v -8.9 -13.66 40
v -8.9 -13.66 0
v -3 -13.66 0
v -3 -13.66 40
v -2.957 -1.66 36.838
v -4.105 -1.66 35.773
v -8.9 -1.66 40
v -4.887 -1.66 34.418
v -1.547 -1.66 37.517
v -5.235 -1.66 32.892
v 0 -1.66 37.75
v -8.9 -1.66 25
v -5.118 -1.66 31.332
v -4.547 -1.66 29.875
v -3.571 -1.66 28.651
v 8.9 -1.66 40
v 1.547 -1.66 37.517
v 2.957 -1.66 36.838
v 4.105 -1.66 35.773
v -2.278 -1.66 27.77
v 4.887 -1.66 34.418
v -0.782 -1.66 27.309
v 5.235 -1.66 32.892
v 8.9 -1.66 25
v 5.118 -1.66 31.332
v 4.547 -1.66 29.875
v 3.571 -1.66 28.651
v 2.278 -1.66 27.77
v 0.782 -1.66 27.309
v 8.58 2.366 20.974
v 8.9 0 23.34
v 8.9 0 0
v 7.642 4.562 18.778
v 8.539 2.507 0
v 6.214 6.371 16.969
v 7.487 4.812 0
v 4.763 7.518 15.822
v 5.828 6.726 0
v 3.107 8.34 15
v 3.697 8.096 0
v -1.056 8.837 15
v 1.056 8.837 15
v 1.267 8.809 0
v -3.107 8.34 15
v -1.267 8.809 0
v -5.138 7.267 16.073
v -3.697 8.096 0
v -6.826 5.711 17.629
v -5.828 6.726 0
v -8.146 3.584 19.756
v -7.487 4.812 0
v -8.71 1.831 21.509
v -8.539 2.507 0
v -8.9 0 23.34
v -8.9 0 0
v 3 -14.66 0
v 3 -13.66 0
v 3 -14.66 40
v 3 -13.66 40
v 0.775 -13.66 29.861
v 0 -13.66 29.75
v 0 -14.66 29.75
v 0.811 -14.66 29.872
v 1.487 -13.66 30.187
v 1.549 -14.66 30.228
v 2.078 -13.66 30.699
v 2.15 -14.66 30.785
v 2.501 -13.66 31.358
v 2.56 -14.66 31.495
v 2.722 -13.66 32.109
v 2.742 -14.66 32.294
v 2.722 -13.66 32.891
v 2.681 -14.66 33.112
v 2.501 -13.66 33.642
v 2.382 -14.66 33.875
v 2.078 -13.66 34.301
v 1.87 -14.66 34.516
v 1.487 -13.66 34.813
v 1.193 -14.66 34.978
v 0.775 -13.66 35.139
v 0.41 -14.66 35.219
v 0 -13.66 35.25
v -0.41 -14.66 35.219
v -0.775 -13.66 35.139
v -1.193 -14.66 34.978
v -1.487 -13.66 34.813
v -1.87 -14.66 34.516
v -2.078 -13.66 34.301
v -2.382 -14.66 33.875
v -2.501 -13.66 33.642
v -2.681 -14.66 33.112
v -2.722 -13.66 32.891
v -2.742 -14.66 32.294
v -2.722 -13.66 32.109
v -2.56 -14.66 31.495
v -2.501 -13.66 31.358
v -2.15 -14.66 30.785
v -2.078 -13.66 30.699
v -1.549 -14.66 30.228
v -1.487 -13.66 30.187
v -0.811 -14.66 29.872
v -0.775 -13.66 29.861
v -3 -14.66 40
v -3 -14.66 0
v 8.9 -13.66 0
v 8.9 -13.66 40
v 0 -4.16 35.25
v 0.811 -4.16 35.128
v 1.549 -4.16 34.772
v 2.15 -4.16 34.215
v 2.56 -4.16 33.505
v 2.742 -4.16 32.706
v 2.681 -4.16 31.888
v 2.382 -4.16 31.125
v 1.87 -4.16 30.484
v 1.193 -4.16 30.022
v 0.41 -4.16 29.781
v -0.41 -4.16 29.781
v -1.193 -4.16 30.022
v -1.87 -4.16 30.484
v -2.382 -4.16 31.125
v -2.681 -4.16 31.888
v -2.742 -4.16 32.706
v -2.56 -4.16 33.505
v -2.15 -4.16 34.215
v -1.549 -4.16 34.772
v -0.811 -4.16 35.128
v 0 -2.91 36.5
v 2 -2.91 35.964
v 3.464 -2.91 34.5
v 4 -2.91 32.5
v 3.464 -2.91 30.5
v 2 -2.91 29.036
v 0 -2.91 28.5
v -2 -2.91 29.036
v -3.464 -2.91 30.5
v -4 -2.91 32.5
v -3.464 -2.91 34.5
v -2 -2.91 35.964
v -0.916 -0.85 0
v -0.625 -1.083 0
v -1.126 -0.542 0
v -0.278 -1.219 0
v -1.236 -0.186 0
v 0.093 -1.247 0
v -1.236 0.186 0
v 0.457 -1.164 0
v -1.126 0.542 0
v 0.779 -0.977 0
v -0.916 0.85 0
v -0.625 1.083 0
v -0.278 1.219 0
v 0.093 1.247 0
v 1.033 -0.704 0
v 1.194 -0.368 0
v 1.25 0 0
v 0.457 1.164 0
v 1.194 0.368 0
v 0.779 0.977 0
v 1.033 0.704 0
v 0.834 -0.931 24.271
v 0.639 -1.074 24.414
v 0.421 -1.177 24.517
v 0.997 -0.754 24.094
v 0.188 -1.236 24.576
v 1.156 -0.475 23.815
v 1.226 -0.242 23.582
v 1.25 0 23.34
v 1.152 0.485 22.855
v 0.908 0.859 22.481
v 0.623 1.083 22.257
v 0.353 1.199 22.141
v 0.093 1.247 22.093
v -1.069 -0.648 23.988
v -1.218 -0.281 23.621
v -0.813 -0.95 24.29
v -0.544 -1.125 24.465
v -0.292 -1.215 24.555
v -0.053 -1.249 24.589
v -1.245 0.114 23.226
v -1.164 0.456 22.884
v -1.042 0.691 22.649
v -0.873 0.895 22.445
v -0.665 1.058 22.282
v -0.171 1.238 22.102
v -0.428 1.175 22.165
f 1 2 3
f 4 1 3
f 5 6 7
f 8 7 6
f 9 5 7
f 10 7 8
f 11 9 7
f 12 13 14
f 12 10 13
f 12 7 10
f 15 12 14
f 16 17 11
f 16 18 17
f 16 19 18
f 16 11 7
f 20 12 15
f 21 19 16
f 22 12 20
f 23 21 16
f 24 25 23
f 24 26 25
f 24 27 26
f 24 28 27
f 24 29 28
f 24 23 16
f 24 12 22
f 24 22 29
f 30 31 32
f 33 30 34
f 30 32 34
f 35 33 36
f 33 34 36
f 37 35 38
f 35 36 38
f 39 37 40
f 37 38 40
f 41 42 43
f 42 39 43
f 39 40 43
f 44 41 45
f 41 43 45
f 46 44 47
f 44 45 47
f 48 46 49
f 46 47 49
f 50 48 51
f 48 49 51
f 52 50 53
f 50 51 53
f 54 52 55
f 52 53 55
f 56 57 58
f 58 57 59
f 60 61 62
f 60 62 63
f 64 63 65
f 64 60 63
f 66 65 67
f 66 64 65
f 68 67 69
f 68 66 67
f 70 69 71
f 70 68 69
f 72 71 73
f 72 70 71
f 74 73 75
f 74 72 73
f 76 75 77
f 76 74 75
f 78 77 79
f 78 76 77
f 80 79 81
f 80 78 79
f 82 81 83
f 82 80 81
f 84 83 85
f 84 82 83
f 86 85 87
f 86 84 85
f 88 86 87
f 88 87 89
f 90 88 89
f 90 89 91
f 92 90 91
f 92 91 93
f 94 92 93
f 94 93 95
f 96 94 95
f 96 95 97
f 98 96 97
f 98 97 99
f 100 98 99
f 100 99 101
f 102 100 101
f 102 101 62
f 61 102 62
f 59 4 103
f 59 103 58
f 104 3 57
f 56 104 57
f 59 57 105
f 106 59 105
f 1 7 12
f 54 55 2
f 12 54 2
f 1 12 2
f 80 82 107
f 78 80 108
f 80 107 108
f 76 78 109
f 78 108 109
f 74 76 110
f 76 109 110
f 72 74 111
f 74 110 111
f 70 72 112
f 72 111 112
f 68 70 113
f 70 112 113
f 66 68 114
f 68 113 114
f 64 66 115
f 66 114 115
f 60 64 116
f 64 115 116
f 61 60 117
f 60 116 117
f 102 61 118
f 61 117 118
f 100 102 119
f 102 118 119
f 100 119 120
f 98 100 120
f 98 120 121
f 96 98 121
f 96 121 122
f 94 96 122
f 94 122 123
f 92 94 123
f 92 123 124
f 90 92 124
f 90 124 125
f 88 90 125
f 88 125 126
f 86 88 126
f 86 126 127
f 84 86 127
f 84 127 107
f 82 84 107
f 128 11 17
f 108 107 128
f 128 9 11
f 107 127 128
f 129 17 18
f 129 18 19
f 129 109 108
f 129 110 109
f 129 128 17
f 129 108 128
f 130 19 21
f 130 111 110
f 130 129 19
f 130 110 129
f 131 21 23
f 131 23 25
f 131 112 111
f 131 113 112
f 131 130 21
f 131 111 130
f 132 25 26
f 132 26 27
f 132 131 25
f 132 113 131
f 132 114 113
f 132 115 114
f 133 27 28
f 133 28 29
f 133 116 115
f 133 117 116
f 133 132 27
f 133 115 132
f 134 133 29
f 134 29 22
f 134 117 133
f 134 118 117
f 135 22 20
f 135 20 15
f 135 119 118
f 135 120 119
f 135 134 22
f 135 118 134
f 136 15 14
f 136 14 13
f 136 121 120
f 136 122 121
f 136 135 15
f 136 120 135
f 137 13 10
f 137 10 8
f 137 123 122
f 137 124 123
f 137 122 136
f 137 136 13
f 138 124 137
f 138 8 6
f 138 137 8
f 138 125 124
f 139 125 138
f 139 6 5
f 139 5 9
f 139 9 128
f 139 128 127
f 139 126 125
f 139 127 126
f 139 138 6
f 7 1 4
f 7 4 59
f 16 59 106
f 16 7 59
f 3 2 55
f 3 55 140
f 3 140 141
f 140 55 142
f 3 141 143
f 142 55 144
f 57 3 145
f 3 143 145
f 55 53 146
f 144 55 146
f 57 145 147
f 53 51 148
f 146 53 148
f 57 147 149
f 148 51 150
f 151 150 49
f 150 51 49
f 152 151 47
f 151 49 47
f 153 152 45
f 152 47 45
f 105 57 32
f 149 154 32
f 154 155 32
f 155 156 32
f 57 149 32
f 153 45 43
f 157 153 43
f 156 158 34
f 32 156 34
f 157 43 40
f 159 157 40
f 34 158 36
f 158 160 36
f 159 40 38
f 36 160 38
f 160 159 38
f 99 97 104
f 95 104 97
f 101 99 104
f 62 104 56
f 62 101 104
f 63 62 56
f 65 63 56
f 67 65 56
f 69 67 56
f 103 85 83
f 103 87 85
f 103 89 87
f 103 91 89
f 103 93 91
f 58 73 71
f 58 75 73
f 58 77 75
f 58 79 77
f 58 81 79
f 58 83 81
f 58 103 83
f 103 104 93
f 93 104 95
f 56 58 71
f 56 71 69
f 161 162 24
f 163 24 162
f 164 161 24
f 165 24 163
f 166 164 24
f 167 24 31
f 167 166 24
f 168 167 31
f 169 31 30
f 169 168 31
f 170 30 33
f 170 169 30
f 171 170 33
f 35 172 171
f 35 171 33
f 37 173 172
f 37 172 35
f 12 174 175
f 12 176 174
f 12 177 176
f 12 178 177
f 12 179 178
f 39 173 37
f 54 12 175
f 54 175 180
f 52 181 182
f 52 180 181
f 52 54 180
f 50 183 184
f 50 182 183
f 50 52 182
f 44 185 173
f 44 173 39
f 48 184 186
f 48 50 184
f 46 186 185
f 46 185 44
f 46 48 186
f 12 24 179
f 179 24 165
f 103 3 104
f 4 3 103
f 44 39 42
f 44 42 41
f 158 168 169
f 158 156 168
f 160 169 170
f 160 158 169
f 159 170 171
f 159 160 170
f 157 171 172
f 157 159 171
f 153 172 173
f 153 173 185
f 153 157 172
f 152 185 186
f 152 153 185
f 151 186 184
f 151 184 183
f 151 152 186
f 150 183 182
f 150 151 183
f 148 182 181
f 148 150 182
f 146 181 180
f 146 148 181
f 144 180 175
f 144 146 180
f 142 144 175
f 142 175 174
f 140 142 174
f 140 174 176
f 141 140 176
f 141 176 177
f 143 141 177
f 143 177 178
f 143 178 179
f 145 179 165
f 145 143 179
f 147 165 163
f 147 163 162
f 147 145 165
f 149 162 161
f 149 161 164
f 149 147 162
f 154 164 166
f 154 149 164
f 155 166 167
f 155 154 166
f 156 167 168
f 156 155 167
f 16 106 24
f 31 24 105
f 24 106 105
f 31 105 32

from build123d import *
from build123d.topology import SkipClean

# Parameters (mm, degrees)
SKETCH1_R           = 1.25
BOSS_EXTRUDE1_DEPTH = 15
SKETCH2_W           = 17.8
SKETCH2_H           = 12
BOSS_EXTRUDE2_DEPTH = 25
CHAMFER1_START      = 15
CHAMFER1_OUTLINE_R  = 1.25
CHAMFER1_DEPTH      = 10
CHAMFER1_START_2    = -10
CHAMFER1_2_DEPTH    = 20
SKETCH3_R           = 2.75
CUT_EXTRUDE1_DEPTH  = 43.699063222
CHAMFER2_SIZE       = 2.5
SKETCH4_W           = 6
SKETCH4_H           = 40
SKETCH4_R           = 2.75
BOSS_EXTRUDE3_DEPTH = 1


with BuildPart() as part:
    # Sketch1 → Boss-Extrude1 (new body)
    with BuildSketch(Plane.XY):
        with BuildLine():
            Line((-8.9, -13.66), (8.9, -13.66))
            Line((8.9, -13.66), (8.9, 0))
            ThreePointArc((8.9, 0), (0, 8.9), (-8.9, 0))
            Line((-8.9, 0), (-8.9, -13.66))
        make_face()
        Circle(SKETCH1_R, mode=Mode.SUBTRACT)
    extrude(amount=BOSS_EXTRUDE1_DEPTH)

    # Sketch2 → Boss-Extrude2 (add)
    with BuildSketch(Plane.XY.offset(15)):
        with Locations((0, -7.66)):
            Rectangle(SKETCH2_W, SKETCH2_H)
    extrude(amount=BOSS_EXTRUDE2_DEPTH)

    # Chamfer1: read off the stored shape, not the designer's step
    # Chamfer1 outline → Chamfer1 (add)
    with BuildSketch(Plane.XY.offset(CHAMFER1_START)):
        with BuildLine():
            Line((-8.9, 0), (-8.9, -1.66))
            Line((-8.9, -1.66), (8.9, -1.66))
            Line((8.9, -1.66), (8.9, 0))
            ThreePointArc((8.9, 0), (0, 8.9), (-8.9, 0))
        make_face()
        Circle(CHAMFER1_OUTLINE_R, mode=Mode.SUBTRACT)
    extrude(amount=CHAMFER1_DEPTH)

    # Chamfer1 2 outline → Chamfer1 2 (cut)
    with BuildSketch(Plane.YZ.offset(CHAMFER1_START_2)):
        Polygon((-1.66, 25), (8.34, 15), (10, 15), (10, 25), align=None)
    extrude(amount=CHAMFER1_2_DEPTH, mode=Mode.SUBTRACT)

    # Sketch3 → Cut-Extrude1 (cut, through all)
    with BuildSketch(Plane(origin=(0, -1.66, 0), x_dir=(1, 0, 0), z_dir=(0, 1, 0))):
        with Locations(Location((0, -32.5, 0), (0, 0, 270))):
            Circle(SKETCH3_R)
    extrude(amount=-CUT_EXTRUDE1_DEPTH, mode=Mode.SUBTRACT)

    # Chamfer2
    chamfer2_edges = [part.edges().sort_by_distance(p)[0] for p in [
        (0, -1.66, 29.75),
    ]]
    chamfer(chamfer2_edges, length=CHAMFER2_SIZE)

    # Sketch4 → Boss-Extrude3 (add)
    with SkipClean():  # the faces are left unmerged after this step: merging them gives an invalid solid
        with BuildSketch(Plane.XZ.offset(13.66)):
            with Locations((0, 20)):
                Rectangle(SKETCH4_W, SKETCH4_H)
            with Locations(Location((0, 32.5, 0), (0, 0, 270))):
                Circle(SKETCH4_R, mode=Mode.SUBTRACT)
        extrude(amount=BOSS_EXTRUDE3_DEPTH)


solid = part.part
